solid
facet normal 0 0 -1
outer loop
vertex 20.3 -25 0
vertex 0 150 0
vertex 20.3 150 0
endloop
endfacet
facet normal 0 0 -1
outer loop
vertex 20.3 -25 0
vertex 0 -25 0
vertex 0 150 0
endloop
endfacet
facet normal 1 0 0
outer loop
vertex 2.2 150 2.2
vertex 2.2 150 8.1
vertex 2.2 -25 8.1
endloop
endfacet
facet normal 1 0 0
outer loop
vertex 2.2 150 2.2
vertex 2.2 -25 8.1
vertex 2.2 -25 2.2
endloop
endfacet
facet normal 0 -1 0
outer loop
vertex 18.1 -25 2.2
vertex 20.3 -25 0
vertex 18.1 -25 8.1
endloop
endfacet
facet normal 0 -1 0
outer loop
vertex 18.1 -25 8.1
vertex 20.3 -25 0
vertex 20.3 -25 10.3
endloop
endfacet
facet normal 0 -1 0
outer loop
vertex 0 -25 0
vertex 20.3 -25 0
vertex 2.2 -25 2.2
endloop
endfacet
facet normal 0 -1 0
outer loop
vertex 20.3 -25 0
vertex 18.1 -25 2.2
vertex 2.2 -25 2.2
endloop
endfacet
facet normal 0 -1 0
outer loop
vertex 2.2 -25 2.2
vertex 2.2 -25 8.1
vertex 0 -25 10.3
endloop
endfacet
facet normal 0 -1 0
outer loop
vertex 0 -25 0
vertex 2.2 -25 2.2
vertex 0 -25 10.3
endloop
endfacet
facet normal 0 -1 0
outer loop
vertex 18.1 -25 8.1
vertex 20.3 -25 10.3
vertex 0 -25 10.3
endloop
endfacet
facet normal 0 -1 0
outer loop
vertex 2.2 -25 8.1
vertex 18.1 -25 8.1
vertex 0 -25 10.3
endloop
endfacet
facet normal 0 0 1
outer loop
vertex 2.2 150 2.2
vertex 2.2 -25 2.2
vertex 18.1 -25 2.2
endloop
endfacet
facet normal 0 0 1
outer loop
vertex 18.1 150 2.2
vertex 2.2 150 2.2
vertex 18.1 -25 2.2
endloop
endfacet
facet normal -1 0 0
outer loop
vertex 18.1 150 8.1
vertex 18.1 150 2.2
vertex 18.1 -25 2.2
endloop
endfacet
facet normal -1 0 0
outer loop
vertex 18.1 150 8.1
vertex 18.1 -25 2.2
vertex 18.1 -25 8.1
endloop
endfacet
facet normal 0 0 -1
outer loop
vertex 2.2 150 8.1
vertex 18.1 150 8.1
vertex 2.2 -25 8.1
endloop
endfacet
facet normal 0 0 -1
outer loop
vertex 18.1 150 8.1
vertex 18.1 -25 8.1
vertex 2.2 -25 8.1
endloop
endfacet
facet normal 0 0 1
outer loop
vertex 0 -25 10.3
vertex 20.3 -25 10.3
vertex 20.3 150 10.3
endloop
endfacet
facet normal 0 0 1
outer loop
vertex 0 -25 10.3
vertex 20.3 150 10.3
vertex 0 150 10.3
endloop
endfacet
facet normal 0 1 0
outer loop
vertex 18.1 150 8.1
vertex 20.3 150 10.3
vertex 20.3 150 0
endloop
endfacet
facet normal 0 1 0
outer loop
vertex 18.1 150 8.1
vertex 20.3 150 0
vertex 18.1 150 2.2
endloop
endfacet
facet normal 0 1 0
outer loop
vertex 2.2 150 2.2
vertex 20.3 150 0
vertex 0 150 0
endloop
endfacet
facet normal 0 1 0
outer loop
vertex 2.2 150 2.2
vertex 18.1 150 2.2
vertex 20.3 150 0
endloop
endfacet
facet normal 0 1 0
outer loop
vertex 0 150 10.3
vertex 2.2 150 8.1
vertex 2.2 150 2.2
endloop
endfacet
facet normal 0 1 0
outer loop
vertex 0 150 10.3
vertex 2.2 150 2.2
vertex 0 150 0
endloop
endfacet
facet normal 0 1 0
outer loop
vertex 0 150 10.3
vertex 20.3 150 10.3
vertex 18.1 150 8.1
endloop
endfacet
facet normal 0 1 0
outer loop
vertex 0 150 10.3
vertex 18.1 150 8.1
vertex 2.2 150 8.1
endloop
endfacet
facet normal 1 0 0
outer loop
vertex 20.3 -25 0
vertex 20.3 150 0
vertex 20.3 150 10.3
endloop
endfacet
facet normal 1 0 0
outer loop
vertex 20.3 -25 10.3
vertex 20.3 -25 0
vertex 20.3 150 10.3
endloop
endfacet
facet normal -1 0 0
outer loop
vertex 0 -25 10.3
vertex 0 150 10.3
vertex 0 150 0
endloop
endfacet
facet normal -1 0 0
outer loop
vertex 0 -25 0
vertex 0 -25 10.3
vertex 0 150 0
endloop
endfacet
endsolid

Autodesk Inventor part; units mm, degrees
ref_plane "YZ Plane" through (0, 0, 0) normal (1, 0, 0) x (0, 1, 0)
ref_plane "XZ Plane" through (0, 0, 0) normal (0, 1, 0) x (-1, 0, 0)
ref_plane "XY Plane" through (0, 0, 0) normal (0, 0, 1) x (1, 0, 0)
sketch "Sketch1" plane through (0, 0, 0) normal (0, 1, 0) x (-1, 0, 0)
  line L0 (0, 0) -> (-20.3, 0)
  line L1 (-20.3, 0) -> (-20.3, 10.3)
  line L2 (-20.3, 10.3) -> (0, 10.3)
  line L3 (0, 10.3) -> (0, 0)
  line L4 (-2.2, 2.2) -> (-18.1, 2.2)
  line L5 (-18.1, 2.2) -> (-18.1, 8.1)
  line L6 (-18.1, 8.1) -> (-2.2, 8.1)
  line L7 (-2.2, 8.1) -> (-2.2, 2.2)
  dimension "d0" = 20.3
  dimension "d1" = 10.3
  dimension "d2" = 2.2
extrude "Extrusion1" add sketch "Sketch1" along normal blind 150
extrude "Extrusion2" add sketch "Sketch1" against normal blind 25
properties part number "Beam" material "Aluminum 3004-O"
